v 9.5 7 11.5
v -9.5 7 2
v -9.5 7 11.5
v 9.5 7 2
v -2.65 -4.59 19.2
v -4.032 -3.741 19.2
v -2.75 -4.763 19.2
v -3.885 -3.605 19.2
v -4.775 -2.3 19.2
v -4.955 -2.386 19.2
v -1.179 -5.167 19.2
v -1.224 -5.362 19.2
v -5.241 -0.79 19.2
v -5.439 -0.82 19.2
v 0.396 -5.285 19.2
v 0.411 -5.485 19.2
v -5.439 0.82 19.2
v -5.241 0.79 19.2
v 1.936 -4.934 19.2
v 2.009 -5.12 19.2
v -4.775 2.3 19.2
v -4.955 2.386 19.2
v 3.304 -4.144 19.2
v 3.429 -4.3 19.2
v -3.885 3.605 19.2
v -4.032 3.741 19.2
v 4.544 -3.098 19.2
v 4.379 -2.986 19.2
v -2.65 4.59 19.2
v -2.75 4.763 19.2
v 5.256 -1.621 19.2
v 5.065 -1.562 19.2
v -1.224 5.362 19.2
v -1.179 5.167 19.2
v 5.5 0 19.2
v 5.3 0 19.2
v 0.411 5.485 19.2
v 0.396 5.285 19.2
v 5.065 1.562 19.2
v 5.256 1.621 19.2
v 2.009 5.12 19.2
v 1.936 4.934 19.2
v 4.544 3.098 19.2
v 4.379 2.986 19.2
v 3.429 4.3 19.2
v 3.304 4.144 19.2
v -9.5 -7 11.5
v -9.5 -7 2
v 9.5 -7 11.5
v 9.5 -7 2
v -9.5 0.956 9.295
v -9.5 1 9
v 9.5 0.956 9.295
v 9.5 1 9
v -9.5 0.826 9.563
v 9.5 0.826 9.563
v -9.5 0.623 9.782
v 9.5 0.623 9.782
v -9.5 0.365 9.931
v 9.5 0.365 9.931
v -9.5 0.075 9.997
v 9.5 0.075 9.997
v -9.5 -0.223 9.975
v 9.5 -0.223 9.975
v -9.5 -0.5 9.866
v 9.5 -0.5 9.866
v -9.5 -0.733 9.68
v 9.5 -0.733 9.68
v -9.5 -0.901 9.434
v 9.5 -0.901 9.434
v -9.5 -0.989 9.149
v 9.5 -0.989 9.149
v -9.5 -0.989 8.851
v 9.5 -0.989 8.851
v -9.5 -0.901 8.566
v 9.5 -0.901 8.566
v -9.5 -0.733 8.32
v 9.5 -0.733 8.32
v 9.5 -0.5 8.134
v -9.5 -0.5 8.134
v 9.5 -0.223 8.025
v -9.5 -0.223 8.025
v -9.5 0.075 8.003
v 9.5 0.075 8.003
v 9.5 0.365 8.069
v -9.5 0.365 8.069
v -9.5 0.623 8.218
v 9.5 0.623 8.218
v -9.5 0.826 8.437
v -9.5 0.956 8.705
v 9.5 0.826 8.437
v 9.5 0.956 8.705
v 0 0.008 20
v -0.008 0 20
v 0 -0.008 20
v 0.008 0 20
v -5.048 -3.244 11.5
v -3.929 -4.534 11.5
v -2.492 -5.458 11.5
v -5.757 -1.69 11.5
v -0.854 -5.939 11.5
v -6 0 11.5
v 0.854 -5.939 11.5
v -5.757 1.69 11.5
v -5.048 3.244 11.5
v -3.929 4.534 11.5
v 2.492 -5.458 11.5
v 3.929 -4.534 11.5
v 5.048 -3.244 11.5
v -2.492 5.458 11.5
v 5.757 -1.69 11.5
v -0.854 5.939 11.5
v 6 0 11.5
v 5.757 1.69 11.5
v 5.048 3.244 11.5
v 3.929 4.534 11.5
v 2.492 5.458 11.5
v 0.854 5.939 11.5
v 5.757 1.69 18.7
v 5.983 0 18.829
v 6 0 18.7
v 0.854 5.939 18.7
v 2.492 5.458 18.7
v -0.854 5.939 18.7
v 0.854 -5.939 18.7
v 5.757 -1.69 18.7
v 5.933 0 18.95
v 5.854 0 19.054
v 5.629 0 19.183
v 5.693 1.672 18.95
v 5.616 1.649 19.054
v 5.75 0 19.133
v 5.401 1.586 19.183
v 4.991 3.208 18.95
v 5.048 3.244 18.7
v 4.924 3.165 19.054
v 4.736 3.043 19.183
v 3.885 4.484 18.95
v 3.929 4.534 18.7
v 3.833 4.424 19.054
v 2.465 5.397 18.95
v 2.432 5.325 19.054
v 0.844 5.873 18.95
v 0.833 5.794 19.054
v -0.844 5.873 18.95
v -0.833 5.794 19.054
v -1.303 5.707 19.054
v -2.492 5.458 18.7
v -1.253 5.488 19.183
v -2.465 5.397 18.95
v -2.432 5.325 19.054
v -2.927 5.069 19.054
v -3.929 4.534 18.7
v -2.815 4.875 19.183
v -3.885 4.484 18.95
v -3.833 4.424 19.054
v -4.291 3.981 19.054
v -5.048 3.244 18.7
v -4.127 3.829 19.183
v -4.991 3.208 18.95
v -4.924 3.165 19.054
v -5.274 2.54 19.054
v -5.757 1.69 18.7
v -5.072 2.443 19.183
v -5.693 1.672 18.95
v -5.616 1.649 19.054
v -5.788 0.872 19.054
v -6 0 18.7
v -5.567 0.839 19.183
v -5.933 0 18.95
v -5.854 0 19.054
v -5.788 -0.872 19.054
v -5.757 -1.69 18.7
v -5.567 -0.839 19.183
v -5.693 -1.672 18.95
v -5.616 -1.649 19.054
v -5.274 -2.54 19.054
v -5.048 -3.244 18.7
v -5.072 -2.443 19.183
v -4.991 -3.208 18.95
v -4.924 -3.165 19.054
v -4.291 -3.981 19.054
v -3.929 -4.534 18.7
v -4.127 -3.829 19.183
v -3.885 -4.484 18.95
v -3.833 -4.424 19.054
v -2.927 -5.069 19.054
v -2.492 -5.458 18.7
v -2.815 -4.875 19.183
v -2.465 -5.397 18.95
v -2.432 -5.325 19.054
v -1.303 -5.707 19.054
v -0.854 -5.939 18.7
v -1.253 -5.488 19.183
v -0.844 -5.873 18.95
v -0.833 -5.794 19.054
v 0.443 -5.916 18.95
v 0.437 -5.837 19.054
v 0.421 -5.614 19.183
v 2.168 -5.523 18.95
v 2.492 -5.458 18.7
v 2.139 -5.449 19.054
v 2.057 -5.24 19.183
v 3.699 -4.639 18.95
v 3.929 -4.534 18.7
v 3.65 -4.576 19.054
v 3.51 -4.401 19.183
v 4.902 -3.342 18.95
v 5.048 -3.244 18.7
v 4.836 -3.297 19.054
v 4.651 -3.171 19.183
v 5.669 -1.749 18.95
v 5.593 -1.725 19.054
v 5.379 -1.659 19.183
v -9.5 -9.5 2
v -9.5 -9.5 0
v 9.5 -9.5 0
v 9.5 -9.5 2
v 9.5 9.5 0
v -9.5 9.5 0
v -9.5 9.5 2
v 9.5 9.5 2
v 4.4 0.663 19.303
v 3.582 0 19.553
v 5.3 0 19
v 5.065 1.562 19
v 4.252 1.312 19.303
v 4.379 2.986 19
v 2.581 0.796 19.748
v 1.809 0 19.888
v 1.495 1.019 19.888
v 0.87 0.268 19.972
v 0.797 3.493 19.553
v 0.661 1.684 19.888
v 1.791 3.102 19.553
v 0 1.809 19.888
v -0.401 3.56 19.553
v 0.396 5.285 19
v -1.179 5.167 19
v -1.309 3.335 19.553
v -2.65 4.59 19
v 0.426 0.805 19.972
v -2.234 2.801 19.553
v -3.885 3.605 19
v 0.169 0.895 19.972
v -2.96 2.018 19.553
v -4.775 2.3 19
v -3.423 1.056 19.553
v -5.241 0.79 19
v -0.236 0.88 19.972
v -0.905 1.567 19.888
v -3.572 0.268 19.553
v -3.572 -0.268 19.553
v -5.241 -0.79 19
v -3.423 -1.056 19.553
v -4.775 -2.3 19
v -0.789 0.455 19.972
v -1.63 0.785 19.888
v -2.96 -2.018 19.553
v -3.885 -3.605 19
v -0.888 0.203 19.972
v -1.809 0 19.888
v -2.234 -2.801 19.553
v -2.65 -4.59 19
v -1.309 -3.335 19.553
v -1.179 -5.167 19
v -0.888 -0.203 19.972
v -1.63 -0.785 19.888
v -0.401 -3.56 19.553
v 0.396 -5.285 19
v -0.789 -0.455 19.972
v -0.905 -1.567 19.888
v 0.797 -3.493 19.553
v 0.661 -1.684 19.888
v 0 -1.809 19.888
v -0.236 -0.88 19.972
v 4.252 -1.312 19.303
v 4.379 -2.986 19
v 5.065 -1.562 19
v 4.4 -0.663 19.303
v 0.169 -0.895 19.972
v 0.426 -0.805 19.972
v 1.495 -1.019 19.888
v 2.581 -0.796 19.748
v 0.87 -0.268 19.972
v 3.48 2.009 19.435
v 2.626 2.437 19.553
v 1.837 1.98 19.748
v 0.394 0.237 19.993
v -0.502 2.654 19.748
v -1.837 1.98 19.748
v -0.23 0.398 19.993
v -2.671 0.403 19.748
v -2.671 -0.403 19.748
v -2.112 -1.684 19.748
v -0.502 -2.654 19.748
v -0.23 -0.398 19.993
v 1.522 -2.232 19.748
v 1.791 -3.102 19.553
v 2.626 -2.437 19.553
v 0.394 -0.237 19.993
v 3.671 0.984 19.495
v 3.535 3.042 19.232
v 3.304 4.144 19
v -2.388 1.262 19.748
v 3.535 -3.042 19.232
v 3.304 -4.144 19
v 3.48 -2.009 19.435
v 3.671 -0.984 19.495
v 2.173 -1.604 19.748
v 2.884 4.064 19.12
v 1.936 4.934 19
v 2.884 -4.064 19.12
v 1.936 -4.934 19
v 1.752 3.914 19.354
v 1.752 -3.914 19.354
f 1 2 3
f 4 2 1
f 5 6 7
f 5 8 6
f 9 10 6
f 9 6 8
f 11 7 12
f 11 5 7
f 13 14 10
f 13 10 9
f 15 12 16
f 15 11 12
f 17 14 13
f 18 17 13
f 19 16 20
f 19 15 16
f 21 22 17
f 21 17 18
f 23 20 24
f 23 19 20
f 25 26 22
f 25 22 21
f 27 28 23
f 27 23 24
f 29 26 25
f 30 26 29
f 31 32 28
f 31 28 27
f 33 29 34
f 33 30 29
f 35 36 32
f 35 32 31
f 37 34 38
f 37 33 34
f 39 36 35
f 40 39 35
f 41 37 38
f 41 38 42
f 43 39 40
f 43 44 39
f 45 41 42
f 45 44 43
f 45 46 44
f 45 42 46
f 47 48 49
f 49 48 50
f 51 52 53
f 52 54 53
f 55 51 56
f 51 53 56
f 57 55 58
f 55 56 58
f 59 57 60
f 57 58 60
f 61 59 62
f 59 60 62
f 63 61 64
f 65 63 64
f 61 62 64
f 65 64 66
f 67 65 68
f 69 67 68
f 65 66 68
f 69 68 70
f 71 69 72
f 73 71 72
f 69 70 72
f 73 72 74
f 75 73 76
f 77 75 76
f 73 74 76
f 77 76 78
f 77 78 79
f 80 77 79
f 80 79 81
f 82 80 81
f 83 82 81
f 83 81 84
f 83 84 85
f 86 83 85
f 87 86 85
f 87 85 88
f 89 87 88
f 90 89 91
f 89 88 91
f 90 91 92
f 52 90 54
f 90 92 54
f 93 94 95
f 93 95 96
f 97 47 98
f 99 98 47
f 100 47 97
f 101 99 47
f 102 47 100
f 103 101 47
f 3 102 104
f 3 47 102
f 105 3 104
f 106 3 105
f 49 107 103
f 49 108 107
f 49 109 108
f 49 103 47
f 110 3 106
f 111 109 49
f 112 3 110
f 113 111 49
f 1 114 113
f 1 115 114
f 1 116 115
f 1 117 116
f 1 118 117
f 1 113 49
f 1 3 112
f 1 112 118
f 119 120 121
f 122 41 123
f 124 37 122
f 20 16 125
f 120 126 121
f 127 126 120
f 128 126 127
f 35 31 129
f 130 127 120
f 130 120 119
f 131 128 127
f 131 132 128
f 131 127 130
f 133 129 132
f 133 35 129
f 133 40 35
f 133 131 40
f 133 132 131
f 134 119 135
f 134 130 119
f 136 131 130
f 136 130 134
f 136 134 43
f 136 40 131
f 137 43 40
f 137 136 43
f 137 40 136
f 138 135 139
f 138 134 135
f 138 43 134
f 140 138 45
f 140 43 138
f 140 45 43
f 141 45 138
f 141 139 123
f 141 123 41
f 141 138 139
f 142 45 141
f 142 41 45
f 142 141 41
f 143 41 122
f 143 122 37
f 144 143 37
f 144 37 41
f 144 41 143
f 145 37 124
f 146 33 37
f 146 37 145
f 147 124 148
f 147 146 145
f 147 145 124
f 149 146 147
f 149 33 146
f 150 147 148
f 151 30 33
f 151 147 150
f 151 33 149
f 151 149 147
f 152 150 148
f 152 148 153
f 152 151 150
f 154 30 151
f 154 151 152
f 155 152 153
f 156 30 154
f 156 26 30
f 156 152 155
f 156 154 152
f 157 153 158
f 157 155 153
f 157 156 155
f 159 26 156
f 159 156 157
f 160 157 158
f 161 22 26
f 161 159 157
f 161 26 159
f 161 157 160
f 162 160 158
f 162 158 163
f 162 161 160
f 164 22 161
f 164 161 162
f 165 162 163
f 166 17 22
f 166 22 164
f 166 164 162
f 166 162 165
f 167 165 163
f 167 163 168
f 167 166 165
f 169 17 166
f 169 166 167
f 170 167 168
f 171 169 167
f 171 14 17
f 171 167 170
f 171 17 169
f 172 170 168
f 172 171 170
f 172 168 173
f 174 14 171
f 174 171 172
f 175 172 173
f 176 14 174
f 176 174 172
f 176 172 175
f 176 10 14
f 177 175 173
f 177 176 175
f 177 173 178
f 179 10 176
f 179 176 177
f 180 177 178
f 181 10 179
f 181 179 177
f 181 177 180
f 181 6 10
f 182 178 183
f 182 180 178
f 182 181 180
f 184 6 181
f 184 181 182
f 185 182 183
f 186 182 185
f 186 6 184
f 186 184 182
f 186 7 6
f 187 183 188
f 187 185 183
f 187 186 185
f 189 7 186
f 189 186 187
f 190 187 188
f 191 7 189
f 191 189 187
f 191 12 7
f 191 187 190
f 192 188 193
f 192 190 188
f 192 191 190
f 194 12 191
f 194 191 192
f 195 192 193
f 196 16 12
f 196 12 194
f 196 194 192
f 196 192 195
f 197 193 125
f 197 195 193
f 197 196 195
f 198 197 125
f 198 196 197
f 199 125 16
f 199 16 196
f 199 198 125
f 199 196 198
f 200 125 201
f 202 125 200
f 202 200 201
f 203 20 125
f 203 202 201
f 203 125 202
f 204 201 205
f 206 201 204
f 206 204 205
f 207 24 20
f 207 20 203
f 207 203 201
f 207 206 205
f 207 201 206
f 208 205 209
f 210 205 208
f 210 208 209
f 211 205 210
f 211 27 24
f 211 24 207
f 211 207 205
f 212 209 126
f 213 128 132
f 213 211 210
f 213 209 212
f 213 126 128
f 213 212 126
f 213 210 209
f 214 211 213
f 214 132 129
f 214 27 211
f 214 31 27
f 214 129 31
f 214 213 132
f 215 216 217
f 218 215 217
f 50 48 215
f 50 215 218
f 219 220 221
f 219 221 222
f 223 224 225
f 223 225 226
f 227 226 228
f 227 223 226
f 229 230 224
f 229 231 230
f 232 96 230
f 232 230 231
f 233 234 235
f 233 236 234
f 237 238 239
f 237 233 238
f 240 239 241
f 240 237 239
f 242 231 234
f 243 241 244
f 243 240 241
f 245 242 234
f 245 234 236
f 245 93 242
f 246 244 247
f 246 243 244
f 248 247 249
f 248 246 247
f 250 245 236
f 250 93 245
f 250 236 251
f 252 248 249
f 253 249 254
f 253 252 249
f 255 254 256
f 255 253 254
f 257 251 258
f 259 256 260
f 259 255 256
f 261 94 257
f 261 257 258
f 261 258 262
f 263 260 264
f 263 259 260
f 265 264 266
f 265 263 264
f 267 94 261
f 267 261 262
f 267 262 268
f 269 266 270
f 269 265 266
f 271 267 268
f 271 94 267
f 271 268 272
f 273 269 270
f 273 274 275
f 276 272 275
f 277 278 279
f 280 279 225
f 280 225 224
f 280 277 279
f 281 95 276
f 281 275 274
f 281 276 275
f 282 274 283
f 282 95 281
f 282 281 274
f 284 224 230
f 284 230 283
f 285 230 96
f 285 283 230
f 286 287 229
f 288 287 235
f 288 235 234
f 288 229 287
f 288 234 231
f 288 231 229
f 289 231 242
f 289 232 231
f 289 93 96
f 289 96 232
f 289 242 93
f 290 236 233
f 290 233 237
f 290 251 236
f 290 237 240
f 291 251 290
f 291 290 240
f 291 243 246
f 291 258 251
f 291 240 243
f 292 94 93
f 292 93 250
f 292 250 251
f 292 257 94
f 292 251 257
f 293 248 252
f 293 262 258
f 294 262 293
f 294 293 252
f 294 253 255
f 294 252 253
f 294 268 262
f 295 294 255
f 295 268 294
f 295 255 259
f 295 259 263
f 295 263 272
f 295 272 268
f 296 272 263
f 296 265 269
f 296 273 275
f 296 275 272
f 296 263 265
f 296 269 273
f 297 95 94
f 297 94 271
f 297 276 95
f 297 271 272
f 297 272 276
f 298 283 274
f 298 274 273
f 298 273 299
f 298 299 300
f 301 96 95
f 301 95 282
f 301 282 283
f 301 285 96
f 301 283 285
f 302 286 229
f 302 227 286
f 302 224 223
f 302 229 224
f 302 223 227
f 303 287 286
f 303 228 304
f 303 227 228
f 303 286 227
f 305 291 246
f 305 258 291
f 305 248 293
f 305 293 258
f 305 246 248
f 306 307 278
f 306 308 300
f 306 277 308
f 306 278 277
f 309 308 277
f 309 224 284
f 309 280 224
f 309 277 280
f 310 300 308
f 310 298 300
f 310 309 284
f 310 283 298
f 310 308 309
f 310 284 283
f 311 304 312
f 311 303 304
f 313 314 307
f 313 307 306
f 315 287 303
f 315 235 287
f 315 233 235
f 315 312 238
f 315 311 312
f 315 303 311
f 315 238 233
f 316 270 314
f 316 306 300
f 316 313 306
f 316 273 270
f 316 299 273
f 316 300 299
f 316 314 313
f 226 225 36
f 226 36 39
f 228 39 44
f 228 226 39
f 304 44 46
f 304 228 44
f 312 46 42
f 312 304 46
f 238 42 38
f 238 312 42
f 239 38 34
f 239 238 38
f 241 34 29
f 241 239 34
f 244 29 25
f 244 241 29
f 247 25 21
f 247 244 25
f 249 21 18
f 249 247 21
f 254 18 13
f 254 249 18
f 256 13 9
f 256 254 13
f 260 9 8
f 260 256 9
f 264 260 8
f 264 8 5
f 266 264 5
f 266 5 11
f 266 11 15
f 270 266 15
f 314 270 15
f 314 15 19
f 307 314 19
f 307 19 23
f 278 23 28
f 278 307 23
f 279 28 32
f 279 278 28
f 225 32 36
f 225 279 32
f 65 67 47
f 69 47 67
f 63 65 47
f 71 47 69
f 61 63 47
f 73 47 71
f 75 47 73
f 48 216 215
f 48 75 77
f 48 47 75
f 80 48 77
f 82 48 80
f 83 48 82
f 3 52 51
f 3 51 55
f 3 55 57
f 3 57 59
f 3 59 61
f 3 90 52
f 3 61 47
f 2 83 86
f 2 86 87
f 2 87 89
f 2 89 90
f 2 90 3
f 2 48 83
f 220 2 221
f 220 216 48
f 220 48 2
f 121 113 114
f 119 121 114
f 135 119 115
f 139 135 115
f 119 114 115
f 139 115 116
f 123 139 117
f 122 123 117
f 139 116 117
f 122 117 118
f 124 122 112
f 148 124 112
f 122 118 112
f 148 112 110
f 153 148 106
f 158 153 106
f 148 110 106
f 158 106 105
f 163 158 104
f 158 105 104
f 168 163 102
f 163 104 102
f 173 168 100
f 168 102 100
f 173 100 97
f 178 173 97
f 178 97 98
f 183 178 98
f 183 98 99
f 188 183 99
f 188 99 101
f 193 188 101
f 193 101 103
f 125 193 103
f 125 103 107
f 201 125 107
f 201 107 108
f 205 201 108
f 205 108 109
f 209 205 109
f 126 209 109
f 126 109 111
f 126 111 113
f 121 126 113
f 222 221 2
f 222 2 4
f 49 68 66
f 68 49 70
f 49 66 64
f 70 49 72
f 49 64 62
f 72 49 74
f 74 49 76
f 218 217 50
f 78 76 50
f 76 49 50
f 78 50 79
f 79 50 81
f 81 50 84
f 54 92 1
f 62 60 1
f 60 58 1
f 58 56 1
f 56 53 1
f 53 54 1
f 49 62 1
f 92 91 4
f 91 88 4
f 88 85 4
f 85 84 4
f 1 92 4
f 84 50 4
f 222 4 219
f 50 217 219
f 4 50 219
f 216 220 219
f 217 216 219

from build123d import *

# Parameters (mm, degrees)
F0_W          = 19
F0_H          = 19
F3_DEPTH      = 2
F4_START      = 2
F2_W          = 19
F2_H          = 14
F4_DEPTH      = 9.5
F5_START      = 11.5
F1_R          = 6
F5_DEPTH      = 7.5
F6_R          = 1
F7_DEPTH      = 25
F7_DEPTH_BACK = 25
F8_R          = 5.2999998443
F9_DEPTH      = 1
F11_DEPTH     = 0.2
F12_R         = 0.5


# Not quite as in the source:
# - a fillet or chamfer that OpenCascade refuses, or shapes differently, is made with other operations: its cross-section is extruded or revolved along the edge and cut away or added


with BuildPart() as f3:
    # F0 (on Top) → F3 (new body)
    with BuildSketch(Plane.XY):
        Rectangle(F0_W, F0_H)
    extrude(amount=F3_DEPTH)

    # F2 (on Top) → F4 (join)
    with BuildSketch(Plane.XY.offset(F4_START)):
        Rectangle(F2_W, F2_H)
    extrude(amount=F4_DEPTH)

    # F1 (on Top) → F5 (join)
    with BuildSketch(Plane.XY.offset(F5_START)):
        Circle(F1_R)
    extrude(amount=F5_DEPTH)

    # F6 (on Right) → F7 (cut, two sides)
    with BuildSketch(Plane.YZ) as f7_sk:
        with Locations((0, 9)):
            Circle(F6_R)
    extrude(amount=-F7_DEPTH, mode=Mode.SUBTRACT)
    extrude(f7_sk.sketch, amount=F7_DEPTH_BACK, mode=Mode.SUBTRACT)

    # F8 (on face) → F9 (join)
    with BuildSketch(Plane.XY.offset(19)):
        Circle(F8_R)
    extrude(amount=F9_DEPTH)

    # F10: fillet of radius 14.5 on 1 edges, made by hand

    # F10_s1 → F10_t2 (revolve, cut)
    with BuildSketch(Plane.XZ):
        with BuildLine():
            ThreePointArc((5.2999998443, 19), (2.7010796257, 19.7478068488), (0.0084972222, 20))
            Line((0.0084972222, 20), (5.2999998443, 20))
            Line((5.2999998443, 20), (5.2999998443, 19))
        make_face()
    revolve(axis=Axis((0, 0, 20), (0, 0, 1)), mode=Mode.SUBTRACT)

    # F11 (add): a face of the model
    f11_faces = [f3.faces().sort_by_distance(p)[0] for p in [
        (-5.8302943725, 0, 19),
    ]]
    extrude(f11_faces, amount=F11_DEPTH)

    # F12
    f12_edges = [f3.edges().sort_by_distance(p)[0] for p in [
        (-6, 0, 19.2),
    ]]
    fillet(f12_edges, radius=F12_R)


solid = f3.part
